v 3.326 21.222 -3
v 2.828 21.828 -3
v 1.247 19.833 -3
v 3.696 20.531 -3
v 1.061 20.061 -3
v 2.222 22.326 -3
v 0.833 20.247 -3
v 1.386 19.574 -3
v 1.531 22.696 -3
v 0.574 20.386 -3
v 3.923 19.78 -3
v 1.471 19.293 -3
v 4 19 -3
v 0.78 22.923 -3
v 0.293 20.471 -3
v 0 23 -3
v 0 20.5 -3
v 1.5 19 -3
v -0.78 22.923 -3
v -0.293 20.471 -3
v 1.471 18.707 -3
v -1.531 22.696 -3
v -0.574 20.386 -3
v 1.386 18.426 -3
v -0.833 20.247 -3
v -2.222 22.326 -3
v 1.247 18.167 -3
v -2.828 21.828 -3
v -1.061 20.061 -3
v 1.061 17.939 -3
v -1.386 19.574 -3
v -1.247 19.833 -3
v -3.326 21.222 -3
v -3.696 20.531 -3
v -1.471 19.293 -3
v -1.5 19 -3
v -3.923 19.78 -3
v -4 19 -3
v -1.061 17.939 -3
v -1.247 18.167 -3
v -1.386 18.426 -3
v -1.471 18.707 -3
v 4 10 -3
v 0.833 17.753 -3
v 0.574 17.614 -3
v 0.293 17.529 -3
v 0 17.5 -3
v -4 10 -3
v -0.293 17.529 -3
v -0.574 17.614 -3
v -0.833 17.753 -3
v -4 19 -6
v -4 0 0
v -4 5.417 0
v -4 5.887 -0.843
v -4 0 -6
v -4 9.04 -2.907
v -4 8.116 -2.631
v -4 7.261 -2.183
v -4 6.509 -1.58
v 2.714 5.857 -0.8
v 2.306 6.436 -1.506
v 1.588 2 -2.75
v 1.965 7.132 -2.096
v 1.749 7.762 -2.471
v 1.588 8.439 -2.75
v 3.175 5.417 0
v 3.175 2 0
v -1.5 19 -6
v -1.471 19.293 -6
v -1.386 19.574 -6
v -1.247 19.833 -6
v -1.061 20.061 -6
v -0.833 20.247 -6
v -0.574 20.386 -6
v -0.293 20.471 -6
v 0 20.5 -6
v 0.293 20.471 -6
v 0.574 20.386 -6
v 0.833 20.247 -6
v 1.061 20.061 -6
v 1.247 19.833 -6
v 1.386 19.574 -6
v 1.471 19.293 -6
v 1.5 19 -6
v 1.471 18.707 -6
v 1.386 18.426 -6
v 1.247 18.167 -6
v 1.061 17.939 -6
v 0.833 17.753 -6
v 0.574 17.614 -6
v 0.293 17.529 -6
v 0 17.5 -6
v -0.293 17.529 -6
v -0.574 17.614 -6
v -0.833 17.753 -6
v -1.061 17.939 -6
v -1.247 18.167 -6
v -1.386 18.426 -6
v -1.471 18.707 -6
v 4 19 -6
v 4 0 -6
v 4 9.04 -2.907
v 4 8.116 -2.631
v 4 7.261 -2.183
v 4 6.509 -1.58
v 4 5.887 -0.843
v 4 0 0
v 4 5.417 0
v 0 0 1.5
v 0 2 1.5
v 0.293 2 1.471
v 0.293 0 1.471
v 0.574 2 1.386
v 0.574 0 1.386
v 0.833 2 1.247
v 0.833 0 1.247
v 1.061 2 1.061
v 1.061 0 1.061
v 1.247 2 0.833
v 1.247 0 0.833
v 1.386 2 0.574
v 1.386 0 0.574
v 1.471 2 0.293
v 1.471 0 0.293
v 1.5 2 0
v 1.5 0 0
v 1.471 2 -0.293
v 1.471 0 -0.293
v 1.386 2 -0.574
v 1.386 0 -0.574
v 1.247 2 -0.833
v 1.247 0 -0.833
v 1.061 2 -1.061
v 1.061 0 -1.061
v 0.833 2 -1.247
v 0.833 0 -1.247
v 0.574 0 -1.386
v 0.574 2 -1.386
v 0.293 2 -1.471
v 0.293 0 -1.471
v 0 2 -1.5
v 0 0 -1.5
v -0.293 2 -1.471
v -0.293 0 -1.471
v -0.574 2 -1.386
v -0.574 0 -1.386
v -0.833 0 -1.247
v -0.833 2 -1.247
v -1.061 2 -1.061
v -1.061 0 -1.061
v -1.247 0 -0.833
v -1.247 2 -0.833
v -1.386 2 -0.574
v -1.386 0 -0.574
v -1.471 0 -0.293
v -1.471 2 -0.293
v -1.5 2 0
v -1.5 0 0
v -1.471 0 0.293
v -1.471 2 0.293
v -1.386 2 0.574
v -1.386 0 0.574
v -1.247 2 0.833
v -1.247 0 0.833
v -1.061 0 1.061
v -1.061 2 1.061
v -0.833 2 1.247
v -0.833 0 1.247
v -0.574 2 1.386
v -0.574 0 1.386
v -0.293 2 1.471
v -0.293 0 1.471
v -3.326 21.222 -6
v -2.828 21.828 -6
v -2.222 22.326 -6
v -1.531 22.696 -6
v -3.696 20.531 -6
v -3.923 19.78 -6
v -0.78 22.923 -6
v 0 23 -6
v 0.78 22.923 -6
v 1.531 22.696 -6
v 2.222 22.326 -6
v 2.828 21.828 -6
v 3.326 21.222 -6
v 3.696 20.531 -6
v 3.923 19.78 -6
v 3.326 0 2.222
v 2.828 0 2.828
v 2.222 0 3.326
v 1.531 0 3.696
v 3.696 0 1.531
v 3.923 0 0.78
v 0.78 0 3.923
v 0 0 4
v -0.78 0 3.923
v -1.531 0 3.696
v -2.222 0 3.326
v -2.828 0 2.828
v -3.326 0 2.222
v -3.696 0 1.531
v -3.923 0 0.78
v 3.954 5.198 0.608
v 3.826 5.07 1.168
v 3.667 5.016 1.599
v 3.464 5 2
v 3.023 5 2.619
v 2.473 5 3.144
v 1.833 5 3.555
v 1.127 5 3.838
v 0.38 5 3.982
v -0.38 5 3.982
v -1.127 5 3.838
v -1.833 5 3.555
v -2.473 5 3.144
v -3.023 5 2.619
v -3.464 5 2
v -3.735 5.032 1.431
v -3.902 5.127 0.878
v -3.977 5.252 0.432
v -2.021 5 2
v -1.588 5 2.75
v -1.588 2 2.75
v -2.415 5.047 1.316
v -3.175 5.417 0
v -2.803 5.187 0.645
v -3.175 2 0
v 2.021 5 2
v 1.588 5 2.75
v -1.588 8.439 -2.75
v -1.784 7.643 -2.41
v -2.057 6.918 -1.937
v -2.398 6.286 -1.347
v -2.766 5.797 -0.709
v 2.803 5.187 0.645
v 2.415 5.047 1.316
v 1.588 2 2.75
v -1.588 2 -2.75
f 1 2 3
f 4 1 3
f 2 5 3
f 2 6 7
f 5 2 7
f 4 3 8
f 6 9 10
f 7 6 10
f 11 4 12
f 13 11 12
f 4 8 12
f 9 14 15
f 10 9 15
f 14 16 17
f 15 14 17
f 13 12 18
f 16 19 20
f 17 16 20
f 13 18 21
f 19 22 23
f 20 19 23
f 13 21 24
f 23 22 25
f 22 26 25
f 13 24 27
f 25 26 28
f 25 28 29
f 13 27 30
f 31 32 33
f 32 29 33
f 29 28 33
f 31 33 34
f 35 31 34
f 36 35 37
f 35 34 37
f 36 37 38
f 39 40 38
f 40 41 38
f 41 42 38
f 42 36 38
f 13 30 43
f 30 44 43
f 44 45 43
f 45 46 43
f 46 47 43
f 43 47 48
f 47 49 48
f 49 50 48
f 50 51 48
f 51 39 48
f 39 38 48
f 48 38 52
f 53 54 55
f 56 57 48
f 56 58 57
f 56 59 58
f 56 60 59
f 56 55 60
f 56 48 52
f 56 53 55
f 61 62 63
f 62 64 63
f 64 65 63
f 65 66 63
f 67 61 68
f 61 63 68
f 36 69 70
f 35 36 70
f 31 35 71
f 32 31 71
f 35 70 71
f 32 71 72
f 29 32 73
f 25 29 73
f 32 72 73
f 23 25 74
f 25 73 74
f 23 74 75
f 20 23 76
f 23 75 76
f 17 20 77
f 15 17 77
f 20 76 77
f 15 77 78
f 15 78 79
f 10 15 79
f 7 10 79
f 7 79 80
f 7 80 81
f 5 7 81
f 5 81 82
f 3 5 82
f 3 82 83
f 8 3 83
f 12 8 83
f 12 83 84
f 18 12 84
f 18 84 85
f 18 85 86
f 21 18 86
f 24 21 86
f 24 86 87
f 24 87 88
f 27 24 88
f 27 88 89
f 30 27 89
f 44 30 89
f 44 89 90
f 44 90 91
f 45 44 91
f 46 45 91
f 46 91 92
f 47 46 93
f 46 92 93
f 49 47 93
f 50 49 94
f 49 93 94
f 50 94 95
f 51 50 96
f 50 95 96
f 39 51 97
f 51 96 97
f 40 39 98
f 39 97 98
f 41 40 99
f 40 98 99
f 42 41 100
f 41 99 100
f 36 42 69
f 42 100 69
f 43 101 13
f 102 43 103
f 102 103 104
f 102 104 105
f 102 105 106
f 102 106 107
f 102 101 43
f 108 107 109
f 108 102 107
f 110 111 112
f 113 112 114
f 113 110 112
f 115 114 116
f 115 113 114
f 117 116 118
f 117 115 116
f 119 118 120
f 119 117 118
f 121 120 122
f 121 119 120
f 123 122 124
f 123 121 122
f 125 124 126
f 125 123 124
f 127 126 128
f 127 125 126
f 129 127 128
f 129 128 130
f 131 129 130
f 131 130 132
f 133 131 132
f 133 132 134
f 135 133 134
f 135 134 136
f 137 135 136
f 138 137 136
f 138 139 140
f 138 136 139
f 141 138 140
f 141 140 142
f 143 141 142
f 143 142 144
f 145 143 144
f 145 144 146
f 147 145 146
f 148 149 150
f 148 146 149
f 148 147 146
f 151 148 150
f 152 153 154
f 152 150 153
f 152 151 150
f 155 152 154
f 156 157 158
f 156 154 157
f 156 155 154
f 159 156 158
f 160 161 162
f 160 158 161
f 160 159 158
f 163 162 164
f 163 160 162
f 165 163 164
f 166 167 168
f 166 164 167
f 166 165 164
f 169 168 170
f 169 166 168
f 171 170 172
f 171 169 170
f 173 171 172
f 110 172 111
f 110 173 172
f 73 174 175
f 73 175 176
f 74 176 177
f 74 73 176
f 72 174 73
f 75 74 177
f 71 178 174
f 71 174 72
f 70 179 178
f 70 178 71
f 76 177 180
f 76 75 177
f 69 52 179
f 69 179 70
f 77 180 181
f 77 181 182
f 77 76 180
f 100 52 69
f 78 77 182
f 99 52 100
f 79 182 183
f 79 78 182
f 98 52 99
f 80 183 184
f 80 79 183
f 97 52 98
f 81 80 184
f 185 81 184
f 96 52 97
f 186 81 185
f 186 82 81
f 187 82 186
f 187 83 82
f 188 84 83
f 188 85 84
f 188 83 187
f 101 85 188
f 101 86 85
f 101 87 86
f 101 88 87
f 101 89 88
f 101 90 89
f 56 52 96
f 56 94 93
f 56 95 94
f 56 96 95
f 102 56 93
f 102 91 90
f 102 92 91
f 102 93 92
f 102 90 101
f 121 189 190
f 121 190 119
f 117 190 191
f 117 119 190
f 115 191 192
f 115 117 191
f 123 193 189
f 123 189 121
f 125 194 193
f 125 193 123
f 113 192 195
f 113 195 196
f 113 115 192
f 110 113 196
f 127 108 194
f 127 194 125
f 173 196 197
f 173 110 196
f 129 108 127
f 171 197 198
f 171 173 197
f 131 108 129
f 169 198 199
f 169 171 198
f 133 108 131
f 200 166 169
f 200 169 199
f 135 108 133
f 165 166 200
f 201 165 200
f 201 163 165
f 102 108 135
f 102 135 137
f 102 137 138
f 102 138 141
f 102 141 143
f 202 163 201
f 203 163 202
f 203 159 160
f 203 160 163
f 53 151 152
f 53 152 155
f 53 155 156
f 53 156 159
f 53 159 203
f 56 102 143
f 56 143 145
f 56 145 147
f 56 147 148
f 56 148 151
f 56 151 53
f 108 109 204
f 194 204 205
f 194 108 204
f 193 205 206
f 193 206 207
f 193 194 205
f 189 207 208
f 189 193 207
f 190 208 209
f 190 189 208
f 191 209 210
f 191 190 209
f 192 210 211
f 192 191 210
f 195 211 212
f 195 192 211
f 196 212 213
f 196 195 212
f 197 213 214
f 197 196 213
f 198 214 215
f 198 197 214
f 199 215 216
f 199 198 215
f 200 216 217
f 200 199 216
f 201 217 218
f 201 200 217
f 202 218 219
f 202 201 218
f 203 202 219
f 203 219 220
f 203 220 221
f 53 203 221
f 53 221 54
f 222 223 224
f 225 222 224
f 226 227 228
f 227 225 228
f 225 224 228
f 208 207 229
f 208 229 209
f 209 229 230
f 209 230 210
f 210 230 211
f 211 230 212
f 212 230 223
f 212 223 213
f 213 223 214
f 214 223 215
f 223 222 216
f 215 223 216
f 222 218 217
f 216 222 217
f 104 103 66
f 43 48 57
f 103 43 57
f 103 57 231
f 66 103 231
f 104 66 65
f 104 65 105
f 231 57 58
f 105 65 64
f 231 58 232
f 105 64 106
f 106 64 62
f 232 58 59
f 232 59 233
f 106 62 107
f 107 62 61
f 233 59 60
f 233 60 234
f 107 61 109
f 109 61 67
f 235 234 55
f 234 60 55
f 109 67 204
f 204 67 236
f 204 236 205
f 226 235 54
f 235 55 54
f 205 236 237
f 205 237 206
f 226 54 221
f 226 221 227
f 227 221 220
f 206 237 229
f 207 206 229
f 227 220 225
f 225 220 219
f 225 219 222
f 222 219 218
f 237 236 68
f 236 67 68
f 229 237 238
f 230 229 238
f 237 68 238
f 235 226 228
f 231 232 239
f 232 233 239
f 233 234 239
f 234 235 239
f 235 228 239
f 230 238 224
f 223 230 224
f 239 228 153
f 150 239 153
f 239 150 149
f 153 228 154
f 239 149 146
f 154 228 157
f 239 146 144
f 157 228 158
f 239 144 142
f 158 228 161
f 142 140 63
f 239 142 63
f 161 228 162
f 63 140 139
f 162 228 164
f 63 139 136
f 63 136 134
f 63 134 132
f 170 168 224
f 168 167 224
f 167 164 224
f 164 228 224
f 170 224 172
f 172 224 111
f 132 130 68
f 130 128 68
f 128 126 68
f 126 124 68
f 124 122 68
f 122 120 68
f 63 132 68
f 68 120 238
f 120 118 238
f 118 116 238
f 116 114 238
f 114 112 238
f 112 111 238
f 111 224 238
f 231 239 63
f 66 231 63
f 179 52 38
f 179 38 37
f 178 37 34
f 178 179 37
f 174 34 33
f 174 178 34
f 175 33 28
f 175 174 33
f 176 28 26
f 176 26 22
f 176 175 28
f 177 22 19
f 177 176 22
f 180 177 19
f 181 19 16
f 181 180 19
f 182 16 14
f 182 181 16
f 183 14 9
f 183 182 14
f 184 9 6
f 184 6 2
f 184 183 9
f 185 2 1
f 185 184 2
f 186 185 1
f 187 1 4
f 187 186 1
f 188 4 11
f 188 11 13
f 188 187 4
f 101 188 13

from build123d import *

# Parameters (mm, degrees)
SKICA1_R                 = 1.5
P_IDAT_VYSUNUT_M1_DEPTH  = 23
SKICA2_OUTSIDE_W         = 17.264
SKICA2_OUTSIDE_H         = 30.264
ODEBRAT_VYSUNUT_M2_DEPTH = 26.079872408
SKICA3_R                 = 1.5
ODEBRAT_VYSUNUT_M3_DEPTH = 26.396850254
ODEBRAT_VYSUNUT_M4_DEPTH = 23.203603329


with BuildPart() as part:
    # Skica1 → Přidat vysunutím1 (new body)
    with BuildSketch(Plane(origin=(0, 0, 0), x_dir=(1, 0, 0), z_dir=(0, 1, 0))):
        with BuildLine():
            Line((-4, 0), (-4, 6))
            Line((-4, 6), (4, 6))
            Line((4, 6), (4, 0))
            ThreePointArc((4, 0), (0, -4), (-4, 0))
        make_face()
        with Locations(Location((0, 0, 0), (0, 0, 270))):
            Circle(SKICA1_R, mode=Mode.SUBTRACT)
    extrude(amount=P_IDAT_VYSUNUT_M1_DEPTH)

    # Skica2 outside → Odebrat vysunutím2 (cut, through all)
    with BuildSketch(Plane.ZY.offset(4)):
        with Locations((-1, 11.5)):
            Rectangle(SKICA2_OUTSIDE_W, SKICA2_OUTSIDE_H)
        with BuildLine():
            Line((-3, 23), (-3, 10))
            ThreePointArc((-3, 10), (-1.535533906, 6.464466094), (2, 5))
            Line((2, 5), (4, 5))
            Line((4, 5), (4, 0))
            Line((4, 0), (-6, 0))
            Line((-6, 0), (-6, 23))
            Line((-6, 23), (-3, 23))
        make_face(mode=Mode.SUBTRACT)
    extrude(amount=-ODEBRAT_VYSUNUT_M2_DEPTH, mode=Mode.SUBTRACT)

    # Skica3 → Odebrat vysunutím3 (cut, through all)
    with BuildSketch(Plane(origin=(0, 0, -6), x_dir=(-1, 0, 0), z_dir=(0, 0, -1))):
        with Locations((0, 19)):
            Circle(SKICA3_R)
        with BuildLine():
            Line((-4, 19), (-7.602186301, 24.874773566))
            Line((-7.602186301, 24.874773566), (9.845338693, 23.958039202))
            Line((9.845338693, 23.958039202), (4, 19))
            ThreePointArc((4, 19), (0, 23), (-4, 19))
        make_face()
    extrude(amount=-ODEBRAT_VYSUNUT_M3_DEPTH, mode=Mode.SUBTRACT)

    # Skica6 → Odebrat vysunutím4 (cut, through all)
    with BuildSketch(Plane.XZ.offset(-2)):
        Polygon((1.58771324, 2.75), (-1.58771324, 2.75), (-3.175426481, 0), (-1.58771324, -2.75), (1.58771324, -2.75), (3.175426481, 0), align=None)
    extrude(amount=-ODEBRAT_VYSUNUT_M4_DEPTH, mode=Mode.SUBTRACT)


solid = part.part
